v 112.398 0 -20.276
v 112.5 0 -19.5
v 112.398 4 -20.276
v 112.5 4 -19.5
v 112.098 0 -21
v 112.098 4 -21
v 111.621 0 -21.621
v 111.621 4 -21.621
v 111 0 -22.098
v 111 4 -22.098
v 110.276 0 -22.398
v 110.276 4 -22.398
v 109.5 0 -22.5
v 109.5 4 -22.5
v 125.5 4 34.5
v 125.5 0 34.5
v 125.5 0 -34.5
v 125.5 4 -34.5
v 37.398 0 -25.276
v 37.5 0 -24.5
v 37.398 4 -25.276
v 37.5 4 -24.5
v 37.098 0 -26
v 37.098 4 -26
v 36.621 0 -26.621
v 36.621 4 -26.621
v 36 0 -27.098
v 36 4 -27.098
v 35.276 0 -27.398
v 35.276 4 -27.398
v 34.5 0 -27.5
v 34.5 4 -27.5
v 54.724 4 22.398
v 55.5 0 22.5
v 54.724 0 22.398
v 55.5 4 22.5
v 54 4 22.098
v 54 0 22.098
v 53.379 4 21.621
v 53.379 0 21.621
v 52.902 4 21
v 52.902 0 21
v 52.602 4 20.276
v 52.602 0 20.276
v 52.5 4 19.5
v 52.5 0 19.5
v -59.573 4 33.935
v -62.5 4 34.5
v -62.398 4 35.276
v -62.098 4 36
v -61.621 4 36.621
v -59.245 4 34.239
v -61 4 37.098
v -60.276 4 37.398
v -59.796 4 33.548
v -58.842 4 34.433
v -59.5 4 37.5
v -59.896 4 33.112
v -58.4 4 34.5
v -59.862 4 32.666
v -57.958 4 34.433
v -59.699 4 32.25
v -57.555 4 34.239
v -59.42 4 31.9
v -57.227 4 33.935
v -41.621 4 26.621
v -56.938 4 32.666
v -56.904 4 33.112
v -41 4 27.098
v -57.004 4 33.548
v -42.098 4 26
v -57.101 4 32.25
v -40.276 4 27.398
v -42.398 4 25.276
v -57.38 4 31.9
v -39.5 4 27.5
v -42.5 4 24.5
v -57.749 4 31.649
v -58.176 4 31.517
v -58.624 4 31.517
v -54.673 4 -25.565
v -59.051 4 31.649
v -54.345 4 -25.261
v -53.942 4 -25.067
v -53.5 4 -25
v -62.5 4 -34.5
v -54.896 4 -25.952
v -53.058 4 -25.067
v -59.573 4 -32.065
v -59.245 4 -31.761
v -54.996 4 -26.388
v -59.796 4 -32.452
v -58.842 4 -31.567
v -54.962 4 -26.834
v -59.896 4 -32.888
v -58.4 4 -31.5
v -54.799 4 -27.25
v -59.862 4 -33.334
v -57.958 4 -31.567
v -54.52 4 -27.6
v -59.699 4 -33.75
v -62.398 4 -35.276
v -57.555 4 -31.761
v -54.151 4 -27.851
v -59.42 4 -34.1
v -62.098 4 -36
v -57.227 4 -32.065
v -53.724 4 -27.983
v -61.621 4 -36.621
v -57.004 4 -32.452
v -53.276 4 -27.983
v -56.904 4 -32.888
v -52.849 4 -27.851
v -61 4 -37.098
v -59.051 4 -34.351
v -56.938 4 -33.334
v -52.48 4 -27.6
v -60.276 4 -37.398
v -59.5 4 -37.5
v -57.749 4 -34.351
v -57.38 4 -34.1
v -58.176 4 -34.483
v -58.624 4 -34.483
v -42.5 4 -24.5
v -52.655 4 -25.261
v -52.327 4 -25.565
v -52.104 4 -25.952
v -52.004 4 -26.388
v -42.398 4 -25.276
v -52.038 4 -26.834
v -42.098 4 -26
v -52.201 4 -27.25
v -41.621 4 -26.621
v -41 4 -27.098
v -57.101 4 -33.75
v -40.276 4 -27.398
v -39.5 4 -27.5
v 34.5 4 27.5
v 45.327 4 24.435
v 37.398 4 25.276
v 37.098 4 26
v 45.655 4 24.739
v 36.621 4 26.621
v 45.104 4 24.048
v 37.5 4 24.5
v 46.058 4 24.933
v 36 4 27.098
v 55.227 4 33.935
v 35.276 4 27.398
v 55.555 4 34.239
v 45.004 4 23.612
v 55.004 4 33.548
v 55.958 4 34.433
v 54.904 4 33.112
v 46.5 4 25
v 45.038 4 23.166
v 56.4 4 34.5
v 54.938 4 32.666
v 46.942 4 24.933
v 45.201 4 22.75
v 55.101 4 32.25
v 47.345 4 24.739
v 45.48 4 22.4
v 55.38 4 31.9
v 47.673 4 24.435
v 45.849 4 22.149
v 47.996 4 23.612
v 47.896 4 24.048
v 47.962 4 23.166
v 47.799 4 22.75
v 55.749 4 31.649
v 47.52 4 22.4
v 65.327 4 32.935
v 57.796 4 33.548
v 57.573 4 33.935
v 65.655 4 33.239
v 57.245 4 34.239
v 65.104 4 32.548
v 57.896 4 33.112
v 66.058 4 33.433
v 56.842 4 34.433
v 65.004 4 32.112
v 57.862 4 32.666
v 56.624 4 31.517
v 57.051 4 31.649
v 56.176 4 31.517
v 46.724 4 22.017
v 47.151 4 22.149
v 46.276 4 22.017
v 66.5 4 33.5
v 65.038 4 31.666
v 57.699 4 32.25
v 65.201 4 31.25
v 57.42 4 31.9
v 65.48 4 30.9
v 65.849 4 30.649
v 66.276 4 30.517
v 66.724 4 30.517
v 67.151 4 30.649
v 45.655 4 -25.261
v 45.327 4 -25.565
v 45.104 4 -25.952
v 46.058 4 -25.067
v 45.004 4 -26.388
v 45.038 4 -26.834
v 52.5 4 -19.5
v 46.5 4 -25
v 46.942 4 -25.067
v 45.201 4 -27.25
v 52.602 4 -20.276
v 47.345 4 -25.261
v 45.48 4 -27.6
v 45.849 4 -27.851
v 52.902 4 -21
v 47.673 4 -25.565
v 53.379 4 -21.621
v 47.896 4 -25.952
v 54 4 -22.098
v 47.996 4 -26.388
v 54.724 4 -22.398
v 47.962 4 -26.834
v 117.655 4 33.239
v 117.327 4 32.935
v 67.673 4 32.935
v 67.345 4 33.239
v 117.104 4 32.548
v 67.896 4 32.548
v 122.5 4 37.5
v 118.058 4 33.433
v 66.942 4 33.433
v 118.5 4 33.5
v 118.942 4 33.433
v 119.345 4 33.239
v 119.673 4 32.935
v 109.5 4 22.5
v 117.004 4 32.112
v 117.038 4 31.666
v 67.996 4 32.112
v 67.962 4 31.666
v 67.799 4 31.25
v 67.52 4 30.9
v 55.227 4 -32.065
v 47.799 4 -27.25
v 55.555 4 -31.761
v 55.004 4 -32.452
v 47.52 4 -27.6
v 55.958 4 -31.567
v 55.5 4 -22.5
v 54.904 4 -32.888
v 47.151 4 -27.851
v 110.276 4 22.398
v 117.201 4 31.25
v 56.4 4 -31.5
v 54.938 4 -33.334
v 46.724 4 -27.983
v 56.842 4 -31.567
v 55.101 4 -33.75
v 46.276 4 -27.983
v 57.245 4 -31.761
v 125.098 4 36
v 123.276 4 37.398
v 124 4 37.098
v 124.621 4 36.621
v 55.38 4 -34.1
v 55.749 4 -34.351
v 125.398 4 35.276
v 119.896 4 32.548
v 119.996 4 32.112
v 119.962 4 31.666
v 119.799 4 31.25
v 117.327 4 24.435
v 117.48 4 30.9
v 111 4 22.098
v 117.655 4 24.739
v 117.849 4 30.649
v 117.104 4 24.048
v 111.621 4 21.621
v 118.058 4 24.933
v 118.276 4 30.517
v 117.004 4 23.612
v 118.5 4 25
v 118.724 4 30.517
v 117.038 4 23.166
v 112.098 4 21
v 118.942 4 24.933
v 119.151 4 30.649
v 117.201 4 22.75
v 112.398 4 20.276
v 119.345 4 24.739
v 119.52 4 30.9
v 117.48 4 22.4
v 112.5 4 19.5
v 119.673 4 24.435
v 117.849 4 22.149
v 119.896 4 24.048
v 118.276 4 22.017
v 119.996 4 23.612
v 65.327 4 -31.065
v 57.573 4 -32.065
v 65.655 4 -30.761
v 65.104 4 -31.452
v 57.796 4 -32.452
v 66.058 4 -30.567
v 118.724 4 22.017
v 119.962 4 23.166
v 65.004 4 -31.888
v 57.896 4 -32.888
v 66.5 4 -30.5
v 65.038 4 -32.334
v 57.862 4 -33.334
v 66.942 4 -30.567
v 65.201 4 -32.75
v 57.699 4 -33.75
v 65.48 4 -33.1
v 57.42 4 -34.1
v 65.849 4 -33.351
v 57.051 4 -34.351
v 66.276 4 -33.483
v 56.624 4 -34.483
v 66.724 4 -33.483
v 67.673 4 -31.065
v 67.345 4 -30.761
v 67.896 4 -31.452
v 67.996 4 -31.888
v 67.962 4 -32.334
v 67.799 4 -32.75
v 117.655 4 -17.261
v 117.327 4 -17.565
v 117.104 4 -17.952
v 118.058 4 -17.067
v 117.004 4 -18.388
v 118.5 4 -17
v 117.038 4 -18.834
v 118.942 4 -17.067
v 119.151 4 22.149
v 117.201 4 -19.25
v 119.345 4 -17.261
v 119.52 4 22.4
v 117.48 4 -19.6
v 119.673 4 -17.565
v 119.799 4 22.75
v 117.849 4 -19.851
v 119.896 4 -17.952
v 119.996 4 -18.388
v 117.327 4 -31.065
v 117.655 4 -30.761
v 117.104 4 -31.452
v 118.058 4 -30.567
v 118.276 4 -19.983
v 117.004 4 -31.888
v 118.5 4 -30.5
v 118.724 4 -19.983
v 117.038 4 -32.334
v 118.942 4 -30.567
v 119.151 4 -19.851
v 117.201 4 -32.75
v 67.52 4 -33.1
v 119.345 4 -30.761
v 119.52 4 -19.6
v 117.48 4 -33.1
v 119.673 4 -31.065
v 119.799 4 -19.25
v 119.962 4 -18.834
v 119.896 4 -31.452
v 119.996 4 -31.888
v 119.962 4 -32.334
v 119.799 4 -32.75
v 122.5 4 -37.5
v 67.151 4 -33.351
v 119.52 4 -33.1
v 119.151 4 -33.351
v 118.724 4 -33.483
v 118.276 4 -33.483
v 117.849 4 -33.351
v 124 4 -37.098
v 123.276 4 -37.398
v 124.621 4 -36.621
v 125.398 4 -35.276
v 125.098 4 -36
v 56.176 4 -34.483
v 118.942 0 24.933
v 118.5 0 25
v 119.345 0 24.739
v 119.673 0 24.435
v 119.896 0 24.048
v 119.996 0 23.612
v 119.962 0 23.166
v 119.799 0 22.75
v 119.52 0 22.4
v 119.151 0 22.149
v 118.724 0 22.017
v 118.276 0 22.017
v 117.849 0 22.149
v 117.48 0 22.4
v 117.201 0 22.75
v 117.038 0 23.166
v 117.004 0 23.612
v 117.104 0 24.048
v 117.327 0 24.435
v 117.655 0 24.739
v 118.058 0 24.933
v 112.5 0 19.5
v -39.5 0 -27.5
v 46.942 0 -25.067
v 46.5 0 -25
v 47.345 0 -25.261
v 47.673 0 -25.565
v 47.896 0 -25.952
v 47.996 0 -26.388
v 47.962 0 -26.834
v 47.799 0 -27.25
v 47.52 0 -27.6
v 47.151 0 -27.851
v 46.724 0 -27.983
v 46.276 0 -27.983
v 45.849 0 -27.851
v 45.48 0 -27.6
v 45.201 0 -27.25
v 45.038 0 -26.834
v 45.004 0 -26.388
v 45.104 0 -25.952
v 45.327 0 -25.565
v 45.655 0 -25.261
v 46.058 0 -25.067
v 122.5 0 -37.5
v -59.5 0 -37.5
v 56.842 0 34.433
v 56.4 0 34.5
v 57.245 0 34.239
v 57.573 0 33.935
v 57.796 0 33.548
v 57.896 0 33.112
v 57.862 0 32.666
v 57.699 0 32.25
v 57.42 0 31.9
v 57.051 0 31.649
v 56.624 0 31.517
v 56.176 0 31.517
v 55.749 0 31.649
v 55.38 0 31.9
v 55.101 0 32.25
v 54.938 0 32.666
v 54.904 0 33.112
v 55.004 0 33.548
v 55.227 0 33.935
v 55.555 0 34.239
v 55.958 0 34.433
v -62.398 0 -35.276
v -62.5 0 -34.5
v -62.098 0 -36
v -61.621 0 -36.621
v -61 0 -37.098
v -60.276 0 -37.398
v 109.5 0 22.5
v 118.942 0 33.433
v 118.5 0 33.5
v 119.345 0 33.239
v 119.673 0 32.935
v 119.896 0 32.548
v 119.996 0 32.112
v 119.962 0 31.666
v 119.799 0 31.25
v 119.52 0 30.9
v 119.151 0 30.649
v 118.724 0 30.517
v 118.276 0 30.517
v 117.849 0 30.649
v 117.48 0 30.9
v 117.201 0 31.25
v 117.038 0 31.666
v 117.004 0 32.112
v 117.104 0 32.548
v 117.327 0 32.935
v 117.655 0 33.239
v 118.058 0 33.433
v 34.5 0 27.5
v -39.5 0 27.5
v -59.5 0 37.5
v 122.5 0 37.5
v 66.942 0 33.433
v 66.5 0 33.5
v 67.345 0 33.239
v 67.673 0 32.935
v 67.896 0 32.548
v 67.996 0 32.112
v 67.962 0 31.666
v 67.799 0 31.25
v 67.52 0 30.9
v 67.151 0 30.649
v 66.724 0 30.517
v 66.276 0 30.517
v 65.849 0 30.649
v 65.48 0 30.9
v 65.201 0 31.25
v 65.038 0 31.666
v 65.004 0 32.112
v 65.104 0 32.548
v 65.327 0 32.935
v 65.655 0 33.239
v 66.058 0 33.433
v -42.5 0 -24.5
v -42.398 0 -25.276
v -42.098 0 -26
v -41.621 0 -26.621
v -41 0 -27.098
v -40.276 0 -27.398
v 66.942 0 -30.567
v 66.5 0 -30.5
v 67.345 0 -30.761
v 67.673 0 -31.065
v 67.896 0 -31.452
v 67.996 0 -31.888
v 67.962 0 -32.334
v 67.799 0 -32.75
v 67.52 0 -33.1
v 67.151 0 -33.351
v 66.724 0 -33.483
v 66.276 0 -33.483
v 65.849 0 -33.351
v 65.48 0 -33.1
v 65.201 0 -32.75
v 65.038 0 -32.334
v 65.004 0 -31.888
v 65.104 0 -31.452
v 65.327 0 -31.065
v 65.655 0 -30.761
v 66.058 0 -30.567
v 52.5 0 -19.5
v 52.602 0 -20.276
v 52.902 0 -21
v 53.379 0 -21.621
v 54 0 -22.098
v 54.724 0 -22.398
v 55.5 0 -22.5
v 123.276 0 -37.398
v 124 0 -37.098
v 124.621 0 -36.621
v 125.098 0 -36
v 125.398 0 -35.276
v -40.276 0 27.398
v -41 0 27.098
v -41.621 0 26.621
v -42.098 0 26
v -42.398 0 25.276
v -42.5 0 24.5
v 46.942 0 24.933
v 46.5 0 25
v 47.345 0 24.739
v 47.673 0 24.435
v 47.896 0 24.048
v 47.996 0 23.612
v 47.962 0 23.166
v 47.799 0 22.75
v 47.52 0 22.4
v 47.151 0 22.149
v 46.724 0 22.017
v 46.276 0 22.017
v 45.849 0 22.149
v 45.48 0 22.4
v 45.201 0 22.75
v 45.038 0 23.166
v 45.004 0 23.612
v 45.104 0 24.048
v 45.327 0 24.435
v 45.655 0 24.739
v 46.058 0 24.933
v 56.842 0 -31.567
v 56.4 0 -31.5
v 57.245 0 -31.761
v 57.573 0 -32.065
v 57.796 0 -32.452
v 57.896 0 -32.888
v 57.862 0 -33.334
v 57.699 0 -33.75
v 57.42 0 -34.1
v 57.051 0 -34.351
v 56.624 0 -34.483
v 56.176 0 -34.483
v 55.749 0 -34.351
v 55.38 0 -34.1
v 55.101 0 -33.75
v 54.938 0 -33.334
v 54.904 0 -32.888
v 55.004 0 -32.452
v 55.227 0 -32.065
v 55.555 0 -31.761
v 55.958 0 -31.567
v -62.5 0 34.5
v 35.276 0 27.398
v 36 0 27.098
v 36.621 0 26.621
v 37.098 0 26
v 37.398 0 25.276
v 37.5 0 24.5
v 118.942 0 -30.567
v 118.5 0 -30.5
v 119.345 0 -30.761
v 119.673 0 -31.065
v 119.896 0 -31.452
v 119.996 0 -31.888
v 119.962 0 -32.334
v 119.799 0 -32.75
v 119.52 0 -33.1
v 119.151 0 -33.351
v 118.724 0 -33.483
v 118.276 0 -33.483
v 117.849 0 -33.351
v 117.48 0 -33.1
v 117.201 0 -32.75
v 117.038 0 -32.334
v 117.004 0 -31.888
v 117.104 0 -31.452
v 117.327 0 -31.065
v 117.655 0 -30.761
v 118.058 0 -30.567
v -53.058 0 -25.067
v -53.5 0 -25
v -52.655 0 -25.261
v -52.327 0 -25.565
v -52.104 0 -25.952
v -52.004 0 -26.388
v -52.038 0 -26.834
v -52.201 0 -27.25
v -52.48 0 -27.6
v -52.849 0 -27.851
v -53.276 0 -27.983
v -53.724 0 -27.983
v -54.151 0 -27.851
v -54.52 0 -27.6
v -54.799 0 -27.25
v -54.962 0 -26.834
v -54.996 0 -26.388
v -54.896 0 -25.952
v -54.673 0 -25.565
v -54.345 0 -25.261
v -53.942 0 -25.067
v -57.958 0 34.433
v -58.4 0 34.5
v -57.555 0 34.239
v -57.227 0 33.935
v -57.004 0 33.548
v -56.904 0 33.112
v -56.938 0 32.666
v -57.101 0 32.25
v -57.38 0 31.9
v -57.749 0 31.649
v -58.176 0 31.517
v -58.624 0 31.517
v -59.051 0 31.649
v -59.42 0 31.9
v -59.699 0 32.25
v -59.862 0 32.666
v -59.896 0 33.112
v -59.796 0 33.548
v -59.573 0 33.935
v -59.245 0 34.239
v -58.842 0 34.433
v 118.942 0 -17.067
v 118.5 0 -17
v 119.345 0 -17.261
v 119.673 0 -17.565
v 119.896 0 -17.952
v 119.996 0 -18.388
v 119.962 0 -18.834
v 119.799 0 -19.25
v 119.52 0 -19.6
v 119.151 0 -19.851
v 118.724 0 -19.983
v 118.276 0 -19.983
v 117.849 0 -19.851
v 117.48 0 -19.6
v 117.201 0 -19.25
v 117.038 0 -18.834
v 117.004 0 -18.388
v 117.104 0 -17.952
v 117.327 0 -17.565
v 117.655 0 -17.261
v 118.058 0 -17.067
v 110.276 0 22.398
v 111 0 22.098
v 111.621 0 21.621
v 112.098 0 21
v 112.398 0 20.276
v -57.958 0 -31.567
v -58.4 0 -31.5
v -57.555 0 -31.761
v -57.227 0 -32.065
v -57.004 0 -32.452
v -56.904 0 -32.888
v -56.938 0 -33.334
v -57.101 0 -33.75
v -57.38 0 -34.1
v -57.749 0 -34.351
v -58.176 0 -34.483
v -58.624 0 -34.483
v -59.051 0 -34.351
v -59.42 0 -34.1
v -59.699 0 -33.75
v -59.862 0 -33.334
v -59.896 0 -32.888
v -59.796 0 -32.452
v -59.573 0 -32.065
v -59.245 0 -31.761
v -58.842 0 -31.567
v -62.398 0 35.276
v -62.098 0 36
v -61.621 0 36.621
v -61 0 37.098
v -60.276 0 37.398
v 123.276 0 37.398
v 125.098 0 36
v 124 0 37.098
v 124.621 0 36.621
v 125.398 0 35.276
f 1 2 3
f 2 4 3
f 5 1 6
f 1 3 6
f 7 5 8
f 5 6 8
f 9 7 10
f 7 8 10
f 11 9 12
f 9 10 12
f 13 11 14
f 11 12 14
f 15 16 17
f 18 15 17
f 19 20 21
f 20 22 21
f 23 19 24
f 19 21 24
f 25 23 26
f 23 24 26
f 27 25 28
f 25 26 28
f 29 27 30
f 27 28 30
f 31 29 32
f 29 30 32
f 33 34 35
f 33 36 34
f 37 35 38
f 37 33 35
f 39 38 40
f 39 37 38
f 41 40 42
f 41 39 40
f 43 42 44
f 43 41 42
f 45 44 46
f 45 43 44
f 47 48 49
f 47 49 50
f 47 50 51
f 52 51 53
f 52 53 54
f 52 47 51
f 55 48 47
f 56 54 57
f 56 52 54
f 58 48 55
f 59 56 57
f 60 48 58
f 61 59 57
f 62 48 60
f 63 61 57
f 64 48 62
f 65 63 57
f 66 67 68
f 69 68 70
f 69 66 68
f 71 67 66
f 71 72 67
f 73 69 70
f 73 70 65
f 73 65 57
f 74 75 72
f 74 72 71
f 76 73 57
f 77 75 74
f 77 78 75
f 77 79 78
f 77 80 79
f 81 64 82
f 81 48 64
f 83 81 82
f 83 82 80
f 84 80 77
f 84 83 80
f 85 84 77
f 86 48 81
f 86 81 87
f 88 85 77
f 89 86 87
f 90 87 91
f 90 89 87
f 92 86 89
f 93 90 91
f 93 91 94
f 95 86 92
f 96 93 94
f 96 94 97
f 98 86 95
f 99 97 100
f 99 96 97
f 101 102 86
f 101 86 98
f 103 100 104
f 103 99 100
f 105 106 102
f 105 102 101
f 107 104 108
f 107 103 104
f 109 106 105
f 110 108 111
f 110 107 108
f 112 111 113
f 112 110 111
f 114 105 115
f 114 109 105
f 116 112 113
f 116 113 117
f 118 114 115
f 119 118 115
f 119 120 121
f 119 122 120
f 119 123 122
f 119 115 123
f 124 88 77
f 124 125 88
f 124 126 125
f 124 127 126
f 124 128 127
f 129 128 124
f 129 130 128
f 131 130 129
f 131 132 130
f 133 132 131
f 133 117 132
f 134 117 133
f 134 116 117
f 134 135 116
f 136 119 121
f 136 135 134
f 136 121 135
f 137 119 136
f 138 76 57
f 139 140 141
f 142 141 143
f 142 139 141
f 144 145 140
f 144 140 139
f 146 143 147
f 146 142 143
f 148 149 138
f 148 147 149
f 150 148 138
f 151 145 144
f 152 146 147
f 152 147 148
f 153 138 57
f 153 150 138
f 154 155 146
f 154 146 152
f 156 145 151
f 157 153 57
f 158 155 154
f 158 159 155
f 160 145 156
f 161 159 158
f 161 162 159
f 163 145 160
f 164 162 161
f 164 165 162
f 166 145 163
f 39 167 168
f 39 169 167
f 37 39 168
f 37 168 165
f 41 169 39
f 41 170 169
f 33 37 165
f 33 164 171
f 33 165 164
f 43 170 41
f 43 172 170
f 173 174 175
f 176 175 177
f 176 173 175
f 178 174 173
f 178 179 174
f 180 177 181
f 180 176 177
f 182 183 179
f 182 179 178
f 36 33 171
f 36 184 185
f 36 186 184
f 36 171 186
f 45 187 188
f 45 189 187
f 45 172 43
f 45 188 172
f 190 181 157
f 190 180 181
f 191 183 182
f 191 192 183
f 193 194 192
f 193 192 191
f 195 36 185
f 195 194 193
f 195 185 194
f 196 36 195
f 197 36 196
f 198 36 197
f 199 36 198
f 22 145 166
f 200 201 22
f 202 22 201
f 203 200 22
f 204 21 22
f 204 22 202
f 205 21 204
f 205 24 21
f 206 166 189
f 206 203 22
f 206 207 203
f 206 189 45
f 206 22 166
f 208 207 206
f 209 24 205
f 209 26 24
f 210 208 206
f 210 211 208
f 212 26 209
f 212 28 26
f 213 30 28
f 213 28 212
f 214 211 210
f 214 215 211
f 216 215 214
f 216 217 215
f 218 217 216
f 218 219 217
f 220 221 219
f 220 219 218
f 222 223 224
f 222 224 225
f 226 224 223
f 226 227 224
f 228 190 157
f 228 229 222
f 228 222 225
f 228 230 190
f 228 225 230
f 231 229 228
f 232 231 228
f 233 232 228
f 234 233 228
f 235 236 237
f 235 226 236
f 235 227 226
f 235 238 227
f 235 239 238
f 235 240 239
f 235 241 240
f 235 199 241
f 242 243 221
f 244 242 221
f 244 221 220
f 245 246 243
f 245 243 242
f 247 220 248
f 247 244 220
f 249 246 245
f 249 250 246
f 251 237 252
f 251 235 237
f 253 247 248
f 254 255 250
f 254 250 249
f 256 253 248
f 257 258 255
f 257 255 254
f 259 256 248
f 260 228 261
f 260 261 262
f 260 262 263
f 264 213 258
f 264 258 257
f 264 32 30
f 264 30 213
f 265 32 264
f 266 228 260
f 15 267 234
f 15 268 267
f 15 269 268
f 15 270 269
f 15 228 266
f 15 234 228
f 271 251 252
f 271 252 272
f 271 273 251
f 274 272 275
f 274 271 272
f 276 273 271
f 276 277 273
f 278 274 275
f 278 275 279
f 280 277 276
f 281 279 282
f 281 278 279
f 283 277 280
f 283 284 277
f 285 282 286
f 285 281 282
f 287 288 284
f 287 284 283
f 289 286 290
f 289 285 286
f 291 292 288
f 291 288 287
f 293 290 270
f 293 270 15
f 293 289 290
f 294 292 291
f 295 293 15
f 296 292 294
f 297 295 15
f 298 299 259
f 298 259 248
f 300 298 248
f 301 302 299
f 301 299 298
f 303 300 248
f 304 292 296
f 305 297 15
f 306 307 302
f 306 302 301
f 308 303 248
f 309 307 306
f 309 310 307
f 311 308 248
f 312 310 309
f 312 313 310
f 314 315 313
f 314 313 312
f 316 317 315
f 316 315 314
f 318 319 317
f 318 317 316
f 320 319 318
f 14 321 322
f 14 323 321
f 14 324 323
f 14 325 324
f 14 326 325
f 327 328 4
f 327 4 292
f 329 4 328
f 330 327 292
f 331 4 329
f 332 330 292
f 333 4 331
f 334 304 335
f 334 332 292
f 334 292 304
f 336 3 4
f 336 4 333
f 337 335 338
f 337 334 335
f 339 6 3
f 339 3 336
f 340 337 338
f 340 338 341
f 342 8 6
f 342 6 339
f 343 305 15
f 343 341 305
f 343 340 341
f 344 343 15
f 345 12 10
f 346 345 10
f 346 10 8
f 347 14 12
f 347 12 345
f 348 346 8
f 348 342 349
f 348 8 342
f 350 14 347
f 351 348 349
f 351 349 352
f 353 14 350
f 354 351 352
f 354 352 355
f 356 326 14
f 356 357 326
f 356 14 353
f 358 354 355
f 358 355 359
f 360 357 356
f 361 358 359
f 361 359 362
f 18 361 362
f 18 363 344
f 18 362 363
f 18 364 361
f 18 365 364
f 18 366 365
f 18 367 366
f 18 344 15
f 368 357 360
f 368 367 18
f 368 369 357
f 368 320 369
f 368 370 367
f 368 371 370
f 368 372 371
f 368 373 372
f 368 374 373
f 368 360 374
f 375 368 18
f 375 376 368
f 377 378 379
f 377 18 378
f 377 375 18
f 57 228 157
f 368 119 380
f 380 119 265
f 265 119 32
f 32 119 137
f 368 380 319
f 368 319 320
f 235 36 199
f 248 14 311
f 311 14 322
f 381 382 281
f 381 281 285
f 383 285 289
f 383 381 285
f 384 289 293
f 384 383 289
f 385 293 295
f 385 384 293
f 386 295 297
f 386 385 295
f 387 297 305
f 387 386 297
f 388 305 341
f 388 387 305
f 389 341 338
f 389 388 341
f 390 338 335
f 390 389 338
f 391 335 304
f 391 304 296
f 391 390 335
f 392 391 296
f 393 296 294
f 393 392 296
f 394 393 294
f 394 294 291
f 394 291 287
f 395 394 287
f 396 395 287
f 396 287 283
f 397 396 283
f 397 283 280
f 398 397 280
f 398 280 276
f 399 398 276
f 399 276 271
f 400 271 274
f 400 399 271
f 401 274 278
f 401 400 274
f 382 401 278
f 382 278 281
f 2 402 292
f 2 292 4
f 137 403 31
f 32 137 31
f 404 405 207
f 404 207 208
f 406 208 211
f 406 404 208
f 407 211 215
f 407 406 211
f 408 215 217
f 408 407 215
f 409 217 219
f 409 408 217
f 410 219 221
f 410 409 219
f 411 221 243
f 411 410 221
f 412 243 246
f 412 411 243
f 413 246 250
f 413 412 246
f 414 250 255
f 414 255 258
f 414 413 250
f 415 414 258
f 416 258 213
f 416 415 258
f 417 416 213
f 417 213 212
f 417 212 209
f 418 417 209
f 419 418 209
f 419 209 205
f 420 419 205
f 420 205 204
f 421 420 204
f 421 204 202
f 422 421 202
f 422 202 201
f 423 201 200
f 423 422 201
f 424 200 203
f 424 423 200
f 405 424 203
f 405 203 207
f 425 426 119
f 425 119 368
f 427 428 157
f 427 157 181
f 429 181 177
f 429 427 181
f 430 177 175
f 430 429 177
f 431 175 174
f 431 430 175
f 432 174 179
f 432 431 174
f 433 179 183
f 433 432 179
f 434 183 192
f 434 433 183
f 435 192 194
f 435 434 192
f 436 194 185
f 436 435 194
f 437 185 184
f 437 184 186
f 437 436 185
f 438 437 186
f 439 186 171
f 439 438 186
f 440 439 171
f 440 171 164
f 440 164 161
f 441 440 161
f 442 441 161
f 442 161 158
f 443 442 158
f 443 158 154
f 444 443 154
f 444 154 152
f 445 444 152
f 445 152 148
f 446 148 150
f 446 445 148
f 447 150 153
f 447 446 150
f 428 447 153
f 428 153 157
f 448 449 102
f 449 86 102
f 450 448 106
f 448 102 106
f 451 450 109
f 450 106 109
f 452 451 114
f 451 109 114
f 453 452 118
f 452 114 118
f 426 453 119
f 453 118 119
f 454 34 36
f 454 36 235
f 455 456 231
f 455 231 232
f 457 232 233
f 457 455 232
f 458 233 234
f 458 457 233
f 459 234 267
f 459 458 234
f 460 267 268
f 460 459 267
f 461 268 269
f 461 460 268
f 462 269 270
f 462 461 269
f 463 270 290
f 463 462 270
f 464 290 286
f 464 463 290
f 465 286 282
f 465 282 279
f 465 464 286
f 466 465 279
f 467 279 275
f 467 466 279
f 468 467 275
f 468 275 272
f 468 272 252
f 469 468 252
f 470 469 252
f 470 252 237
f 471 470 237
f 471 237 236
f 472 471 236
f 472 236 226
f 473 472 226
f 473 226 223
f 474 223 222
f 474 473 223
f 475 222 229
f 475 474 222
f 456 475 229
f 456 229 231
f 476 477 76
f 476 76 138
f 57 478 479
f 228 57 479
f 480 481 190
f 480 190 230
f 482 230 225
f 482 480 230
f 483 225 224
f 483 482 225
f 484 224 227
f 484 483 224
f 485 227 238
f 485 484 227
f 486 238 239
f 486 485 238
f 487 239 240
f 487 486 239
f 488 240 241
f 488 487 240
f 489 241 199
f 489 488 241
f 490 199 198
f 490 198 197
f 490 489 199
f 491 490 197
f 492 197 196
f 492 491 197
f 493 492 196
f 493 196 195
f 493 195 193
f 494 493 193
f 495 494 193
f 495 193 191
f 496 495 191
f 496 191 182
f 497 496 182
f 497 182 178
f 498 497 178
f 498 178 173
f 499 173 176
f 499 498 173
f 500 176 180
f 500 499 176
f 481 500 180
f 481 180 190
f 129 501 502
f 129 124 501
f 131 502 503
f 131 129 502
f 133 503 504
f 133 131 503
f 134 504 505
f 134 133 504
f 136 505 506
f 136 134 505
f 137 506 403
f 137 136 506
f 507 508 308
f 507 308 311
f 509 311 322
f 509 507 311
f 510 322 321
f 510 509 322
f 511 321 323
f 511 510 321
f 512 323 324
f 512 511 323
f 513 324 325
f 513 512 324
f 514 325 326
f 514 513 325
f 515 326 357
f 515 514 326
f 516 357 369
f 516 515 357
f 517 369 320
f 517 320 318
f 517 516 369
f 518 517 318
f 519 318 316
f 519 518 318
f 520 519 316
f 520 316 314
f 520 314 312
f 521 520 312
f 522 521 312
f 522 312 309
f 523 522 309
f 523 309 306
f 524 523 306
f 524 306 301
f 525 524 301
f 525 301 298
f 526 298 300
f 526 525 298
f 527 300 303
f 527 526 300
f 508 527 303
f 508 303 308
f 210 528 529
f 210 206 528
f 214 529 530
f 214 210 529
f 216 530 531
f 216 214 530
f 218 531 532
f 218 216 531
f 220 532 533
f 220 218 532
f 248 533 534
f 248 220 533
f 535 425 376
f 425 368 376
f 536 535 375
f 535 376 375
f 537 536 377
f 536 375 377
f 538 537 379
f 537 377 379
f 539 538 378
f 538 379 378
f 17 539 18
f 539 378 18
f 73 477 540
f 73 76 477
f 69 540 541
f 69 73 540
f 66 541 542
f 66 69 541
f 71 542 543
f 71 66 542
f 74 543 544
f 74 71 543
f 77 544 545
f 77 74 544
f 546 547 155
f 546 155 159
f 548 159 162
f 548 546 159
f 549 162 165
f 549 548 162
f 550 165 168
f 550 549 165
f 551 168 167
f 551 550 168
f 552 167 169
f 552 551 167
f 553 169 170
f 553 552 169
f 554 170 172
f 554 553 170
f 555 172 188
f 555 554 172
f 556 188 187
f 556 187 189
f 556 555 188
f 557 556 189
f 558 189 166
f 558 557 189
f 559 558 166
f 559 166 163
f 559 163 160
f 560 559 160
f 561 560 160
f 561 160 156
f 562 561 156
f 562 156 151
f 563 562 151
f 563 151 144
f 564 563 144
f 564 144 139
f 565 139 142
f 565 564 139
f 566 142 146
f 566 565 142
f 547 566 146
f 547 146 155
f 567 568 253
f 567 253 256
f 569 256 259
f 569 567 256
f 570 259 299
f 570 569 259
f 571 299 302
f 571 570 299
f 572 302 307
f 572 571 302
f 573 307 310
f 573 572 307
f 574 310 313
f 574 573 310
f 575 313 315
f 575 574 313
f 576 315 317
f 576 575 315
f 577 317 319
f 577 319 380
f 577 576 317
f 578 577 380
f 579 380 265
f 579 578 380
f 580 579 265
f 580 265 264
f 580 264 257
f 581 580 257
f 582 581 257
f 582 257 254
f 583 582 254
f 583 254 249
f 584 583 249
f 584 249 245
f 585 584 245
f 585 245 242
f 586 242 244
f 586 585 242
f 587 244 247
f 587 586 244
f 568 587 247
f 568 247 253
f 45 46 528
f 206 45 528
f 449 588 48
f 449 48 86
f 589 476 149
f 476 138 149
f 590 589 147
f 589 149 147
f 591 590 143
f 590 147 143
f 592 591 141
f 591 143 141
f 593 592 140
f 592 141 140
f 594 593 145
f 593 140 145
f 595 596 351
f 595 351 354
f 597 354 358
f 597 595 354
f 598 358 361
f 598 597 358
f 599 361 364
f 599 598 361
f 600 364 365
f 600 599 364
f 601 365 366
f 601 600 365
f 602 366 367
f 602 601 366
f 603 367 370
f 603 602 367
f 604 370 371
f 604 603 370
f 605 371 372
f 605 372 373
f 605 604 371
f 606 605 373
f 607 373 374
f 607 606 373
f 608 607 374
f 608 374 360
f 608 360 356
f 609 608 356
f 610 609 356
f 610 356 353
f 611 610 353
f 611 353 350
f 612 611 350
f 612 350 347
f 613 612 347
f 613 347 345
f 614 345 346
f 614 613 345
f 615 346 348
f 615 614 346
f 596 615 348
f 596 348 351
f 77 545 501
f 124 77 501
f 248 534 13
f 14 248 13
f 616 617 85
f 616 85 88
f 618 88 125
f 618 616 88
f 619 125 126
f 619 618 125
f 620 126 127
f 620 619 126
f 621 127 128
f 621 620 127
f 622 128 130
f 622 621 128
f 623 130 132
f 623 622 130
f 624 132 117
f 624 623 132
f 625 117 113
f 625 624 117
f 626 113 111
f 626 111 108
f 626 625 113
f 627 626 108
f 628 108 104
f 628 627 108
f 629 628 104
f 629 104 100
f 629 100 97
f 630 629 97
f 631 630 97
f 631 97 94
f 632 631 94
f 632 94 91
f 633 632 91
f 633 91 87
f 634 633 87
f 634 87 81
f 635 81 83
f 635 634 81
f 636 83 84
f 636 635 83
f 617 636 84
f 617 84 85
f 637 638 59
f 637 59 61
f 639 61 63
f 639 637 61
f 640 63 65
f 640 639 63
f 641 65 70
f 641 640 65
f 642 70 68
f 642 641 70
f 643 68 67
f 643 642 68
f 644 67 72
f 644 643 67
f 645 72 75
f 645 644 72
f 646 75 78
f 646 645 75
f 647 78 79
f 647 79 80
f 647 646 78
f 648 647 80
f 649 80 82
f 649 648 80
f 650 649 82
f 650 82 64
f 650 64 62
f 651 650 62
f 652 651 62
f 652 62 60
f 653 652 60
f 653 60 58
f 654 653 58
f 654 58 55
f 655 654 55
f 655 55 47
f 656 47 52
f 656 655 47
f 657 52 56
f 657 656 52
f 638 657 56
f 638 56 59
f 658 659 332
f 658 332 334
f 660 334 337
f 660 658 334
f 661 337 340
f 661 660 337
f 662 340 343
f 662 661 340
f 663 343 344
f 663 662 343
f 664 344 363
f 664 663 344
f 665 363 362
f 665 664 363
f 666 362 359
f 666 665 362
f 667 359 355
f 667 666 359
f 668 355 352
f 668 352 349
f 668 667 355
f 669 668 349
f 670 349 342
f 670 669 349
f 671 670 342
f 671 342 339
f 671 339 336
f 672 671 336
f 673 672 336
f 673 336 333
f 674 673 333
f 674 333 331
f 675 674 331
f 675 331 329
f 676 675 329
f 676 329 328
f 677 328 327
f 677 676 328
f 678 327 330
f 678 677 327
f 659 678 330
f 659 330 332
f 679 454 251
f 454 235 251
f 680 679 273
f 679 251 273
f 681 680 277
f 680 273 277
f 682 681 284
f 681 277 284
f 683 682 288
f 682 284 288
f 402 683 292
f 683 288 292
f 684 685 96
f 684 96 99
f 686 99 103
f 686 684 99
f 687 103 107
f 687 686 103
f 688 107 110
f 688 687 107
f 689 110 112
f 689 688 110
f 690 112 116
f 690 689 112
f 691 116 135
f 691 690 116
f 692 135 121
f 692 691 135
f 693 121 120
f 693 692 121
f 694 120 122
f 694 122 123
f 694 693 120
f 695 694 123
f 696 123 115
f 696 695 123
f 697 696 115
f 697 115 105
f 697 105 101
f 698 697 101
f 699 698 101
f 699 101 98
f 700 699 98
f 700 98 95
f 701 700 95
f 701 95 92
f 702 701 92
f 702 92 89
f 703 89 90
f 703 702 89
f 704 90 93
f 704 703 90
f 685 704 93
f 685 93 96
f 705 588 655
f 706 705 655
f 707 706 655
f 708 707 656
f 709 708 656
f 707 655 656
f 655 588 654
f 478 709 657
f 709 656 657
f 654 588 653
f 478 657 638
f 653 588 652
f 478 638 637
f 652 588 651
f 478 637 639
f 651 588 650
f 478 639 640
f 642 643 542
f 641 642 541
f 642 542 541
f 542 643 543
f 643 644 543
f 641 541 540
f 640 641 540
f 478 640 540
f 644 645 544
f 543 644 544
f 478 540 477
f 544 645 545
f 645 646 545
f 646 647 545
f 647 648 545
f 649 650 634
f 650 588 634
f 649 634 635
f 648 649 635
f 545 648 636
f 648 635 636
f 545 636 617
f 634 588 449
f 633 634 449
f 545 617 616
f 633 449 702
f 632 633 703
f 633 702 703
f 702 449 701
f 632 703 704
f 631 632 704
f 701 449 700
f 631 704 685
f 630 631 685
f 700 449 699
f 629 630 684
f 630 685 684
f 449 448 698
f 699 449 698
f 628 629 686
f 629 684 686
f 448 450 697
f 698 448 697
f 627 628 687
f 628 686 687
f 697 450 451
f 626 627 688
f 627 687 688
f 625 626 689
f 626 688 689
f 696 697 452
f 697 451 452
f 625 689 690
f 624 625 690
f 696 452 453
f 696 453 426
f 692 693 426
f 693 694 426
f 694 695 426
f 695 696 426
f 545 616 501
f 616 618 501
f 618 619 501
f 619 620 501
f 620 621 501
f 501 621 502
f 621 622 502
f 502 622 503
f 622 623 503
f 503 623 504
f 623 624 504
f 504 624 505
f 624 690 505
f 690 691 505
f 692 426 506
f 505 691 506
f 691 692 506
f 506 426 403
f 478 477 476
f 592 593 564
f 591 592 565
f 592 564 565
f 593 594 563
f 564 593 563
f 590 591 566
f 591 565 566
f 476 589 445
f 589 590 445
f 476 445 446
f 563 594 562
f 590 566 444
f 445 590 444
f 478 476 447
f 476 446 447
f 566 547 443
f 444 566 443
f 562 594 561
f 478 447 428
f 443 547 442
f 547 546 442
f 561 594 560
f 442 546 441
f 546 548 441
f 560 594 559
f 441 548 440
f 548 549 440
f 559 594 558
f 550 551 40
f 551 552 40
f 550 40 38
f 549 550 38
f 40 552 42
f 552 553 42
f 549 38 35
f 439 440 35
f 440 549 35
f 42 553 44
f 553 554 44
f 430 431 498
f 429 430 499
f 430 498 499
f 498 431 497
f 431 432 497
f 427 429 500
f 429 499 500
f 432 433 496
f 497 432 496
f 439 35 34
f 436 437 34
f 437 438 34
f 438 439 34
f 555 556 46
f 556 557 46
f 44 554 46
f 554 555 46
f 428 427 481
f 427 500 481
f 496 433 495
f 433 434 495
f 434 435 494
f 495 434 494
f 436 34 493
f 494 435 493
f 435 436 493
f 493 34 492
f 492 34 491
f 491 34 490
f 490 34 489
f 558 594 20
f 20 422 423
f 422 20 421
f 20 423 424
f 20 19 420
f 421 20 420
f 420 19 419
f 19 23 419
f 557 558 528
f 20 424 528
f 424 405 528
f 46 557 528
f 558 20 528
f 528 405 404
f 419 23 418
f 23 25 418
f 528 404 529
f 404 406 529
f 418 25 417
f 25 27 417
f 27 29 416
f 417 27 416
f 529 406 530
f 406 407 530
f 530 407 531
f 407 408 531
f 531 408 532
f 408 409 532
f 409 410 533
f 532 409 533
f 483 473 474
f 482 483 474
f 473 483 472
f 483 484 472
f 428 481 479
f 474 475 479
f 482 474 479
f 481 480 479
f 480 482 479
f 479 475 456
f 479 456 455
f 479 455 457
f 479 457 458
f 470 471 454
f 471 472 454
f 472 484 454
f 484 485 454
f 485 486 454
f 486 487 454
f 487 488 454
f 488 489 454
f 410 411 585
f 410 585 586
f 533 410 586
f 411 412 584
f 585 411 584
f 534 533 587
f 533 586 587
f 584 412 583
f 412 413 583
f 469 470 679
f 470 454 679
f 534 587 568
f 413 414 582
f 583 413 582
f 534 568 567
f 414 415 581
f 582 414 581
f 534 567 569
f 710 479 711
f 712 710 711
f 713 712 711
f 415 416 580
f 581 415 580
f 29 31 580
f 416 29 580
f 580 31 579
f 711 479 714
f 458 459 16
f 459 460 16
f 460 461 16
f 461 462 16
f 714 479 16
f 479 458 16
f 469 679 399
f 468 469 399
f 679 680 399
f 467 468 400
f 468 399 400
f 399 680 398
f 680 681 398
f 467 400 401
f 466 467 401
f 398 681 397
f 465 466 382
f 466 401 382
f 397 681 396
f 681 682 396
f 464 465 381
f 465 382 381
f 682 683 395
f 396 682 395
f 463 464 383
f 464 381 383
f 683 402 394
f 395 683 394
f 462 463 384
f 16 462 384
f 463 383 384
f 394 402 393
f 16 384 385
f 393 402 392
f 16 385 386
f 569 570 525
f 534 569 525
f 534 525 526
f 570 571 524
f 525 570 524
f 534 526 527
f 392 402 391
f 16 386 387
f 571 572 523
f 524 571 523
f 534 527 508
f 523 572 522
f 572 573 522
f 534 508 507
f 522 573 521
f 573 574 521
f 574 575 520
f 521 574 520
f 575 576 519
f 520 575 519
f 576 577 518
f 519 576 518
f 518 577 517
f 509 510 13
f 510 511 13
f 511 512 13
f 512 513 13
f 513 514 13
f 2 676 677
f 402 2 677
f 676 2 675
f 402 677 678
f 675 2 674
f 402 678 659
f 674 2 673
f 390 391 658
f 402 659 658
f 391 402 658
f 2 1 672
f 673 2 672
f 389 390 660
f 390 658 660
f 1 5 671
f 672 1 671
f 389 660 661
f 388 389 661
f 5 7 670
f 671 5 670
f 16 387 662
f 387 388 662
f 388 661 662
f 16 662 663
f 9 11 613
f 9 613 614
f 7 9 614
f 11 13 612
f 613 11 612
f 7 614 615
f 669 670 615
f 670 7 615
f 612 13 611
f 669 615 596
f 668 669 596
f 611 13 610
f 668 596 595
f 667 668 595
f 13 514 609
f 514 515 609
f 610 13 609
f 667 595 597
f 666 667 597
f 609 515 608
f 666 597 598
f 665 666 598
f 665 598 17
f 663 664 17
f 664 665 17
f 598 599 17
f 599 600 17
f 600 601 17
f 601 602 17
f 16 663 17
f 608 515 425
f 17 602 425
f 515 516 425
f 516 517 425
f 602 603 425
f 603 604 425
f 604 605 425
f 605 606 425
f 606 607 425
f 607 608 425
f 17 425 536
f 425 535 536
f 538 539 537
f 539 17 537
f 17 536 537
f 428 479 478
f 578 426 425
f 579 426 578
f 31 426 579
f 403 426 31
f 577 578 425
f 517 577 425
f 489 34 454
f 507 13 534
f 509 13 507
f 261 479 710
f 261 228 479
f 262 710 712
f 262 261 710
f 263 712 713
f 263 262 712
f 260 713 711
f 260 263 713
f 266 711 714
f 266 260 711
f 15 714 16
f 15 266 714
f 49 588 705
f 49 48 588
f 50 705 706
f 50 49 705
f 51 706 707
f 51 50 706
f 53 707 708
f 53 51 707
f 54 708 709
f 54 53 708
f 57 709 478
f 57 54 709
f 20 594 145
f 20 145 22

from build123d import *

# Parameters (mm, degrees)
SKETCH_1_W      = 188
SKETCH_1_H      = 75
SKETCH_1_W_2    = 60
SKETCH_1_H_2    = 45
SKETCH_1_R      = 1.5
SKETCH_1_W_3    = 80
SKETCH_1_H_3    = 55
EXTRUDE_1_DEPTH = 4
FILLET_1_R      = 3


with BuildPart() as part:
    # 草图1 → 凸台-拉伸1 (new body)
    with BuildSketch(Plane(origin=(0, 0, 0), x_dir=(1, 0, 0), z_dir=(0, 1, 0))):
        with Locations((31.5, 0)):
            Rectangle(SKETCH_1_W, SKETCH_1_H)
        with Locations((82.5, 0)):
            Rectangle(SKETCH_1_W_2, SKETCH_1_H_2, mode=Mode.SUBTRACT)
        with Locations(Location((-58.4, -33, 0), (0, 0, 270))):
            Circle(SKETCH_1_R, mode=Mode.SUBTRACT)
        with Locations(Location((56.4, -33, 0), (0, 0, 270))):
            Circle(SKETCH_1_R, mode=Mode.SUBTRACT)
        with Locations(Location((46.5, -23.5, 0), (0, 0, 270))):
            Circle(SKETCH_1_R, mode=Mode.SUBTRACT)
        with Locations((-2.5, 0)):
            Rectangle(SKETCH_1_W_3, SKETCH_1_H_3, mode=Mode.SUBTRACT)
        with Locations(Location((-53.5, 26.5, 0), (0, 0, 270))):
            Circle(SKETCH_1_R, mode=Mode.SUBTRACT)
        with Locations(Location((-58.4, 33, 0), (0, 0, 270))):
            Circle(SKETCH_1_R, mode=Mode.SUBTRACT)
        with Locations(Location((46.5, 26.5, 0), (0, 0, 270))):
            Circle(SKETCH_1_R, mode=Mode.SUBTRACT)
        with Locations(Location((56.4, 33, 0), (0, 0, 270))):
            Circle(SKETCH_1_R, mode=Mode.SUBTRACT)
        with Locations(Location((66.5, 32, 0), (0, 0, 270))):
            Circle(SKETCH_1_R, mode=Mode.SUBTRACT)
        with Locations(Location((118.5, 32, 0), (0, 0, 270))):
            Circle(SKETCH_1_R, mode=Mode.SUBTRACT)
        with Locations(Location((66.5, -32, 0), (0, 0, 270))):
            Circle(SKETCH_1_R, mode=Mode.SUBTRACT)
        with Locations(Location((118.5, -32, 0), (0, 0, 270))):
            Circle(SKETCH_1_R, mode=Mode.SUBTRACT)
        with Locations(Location((118.5, -23.5, 0), (0, 0, 270))):
            Circle(SKETCH_1_R, mode=Mode.SUBTRACT)
        with Locations(Location((118.5, 18.5, 0), (0, 0, 270))):
            Circle(SKETCH_1_R, mode=Mode.SUBTRACT)
    extrude(amount=EXTRUDE_1_DEPTH)

    # 圆角1
    fillet_1_edges = [part.edges().sort_by_distance(p)[0] for p in [
        (52.5, 2, 22.5),
        (112.5, 2, 22.5),
        (112.5, 2, -22.5),
        (52.5, 2, -22.5),
        (-42.5, 2, 27.5),
        (37.5, 2, 27.5),
        (37.5, 2, -27.5),
        (-42.5, 2, -27.5),
        (125.5, 2, 37.5),
        (-62.5, 2, 37.5),
        (-62.5, 2, -37.5),
        (125.5, 2, -37.5),
    ]]
    fillet(fillet_1_edges, radius=FILLET_1_R)


solid = part.part
